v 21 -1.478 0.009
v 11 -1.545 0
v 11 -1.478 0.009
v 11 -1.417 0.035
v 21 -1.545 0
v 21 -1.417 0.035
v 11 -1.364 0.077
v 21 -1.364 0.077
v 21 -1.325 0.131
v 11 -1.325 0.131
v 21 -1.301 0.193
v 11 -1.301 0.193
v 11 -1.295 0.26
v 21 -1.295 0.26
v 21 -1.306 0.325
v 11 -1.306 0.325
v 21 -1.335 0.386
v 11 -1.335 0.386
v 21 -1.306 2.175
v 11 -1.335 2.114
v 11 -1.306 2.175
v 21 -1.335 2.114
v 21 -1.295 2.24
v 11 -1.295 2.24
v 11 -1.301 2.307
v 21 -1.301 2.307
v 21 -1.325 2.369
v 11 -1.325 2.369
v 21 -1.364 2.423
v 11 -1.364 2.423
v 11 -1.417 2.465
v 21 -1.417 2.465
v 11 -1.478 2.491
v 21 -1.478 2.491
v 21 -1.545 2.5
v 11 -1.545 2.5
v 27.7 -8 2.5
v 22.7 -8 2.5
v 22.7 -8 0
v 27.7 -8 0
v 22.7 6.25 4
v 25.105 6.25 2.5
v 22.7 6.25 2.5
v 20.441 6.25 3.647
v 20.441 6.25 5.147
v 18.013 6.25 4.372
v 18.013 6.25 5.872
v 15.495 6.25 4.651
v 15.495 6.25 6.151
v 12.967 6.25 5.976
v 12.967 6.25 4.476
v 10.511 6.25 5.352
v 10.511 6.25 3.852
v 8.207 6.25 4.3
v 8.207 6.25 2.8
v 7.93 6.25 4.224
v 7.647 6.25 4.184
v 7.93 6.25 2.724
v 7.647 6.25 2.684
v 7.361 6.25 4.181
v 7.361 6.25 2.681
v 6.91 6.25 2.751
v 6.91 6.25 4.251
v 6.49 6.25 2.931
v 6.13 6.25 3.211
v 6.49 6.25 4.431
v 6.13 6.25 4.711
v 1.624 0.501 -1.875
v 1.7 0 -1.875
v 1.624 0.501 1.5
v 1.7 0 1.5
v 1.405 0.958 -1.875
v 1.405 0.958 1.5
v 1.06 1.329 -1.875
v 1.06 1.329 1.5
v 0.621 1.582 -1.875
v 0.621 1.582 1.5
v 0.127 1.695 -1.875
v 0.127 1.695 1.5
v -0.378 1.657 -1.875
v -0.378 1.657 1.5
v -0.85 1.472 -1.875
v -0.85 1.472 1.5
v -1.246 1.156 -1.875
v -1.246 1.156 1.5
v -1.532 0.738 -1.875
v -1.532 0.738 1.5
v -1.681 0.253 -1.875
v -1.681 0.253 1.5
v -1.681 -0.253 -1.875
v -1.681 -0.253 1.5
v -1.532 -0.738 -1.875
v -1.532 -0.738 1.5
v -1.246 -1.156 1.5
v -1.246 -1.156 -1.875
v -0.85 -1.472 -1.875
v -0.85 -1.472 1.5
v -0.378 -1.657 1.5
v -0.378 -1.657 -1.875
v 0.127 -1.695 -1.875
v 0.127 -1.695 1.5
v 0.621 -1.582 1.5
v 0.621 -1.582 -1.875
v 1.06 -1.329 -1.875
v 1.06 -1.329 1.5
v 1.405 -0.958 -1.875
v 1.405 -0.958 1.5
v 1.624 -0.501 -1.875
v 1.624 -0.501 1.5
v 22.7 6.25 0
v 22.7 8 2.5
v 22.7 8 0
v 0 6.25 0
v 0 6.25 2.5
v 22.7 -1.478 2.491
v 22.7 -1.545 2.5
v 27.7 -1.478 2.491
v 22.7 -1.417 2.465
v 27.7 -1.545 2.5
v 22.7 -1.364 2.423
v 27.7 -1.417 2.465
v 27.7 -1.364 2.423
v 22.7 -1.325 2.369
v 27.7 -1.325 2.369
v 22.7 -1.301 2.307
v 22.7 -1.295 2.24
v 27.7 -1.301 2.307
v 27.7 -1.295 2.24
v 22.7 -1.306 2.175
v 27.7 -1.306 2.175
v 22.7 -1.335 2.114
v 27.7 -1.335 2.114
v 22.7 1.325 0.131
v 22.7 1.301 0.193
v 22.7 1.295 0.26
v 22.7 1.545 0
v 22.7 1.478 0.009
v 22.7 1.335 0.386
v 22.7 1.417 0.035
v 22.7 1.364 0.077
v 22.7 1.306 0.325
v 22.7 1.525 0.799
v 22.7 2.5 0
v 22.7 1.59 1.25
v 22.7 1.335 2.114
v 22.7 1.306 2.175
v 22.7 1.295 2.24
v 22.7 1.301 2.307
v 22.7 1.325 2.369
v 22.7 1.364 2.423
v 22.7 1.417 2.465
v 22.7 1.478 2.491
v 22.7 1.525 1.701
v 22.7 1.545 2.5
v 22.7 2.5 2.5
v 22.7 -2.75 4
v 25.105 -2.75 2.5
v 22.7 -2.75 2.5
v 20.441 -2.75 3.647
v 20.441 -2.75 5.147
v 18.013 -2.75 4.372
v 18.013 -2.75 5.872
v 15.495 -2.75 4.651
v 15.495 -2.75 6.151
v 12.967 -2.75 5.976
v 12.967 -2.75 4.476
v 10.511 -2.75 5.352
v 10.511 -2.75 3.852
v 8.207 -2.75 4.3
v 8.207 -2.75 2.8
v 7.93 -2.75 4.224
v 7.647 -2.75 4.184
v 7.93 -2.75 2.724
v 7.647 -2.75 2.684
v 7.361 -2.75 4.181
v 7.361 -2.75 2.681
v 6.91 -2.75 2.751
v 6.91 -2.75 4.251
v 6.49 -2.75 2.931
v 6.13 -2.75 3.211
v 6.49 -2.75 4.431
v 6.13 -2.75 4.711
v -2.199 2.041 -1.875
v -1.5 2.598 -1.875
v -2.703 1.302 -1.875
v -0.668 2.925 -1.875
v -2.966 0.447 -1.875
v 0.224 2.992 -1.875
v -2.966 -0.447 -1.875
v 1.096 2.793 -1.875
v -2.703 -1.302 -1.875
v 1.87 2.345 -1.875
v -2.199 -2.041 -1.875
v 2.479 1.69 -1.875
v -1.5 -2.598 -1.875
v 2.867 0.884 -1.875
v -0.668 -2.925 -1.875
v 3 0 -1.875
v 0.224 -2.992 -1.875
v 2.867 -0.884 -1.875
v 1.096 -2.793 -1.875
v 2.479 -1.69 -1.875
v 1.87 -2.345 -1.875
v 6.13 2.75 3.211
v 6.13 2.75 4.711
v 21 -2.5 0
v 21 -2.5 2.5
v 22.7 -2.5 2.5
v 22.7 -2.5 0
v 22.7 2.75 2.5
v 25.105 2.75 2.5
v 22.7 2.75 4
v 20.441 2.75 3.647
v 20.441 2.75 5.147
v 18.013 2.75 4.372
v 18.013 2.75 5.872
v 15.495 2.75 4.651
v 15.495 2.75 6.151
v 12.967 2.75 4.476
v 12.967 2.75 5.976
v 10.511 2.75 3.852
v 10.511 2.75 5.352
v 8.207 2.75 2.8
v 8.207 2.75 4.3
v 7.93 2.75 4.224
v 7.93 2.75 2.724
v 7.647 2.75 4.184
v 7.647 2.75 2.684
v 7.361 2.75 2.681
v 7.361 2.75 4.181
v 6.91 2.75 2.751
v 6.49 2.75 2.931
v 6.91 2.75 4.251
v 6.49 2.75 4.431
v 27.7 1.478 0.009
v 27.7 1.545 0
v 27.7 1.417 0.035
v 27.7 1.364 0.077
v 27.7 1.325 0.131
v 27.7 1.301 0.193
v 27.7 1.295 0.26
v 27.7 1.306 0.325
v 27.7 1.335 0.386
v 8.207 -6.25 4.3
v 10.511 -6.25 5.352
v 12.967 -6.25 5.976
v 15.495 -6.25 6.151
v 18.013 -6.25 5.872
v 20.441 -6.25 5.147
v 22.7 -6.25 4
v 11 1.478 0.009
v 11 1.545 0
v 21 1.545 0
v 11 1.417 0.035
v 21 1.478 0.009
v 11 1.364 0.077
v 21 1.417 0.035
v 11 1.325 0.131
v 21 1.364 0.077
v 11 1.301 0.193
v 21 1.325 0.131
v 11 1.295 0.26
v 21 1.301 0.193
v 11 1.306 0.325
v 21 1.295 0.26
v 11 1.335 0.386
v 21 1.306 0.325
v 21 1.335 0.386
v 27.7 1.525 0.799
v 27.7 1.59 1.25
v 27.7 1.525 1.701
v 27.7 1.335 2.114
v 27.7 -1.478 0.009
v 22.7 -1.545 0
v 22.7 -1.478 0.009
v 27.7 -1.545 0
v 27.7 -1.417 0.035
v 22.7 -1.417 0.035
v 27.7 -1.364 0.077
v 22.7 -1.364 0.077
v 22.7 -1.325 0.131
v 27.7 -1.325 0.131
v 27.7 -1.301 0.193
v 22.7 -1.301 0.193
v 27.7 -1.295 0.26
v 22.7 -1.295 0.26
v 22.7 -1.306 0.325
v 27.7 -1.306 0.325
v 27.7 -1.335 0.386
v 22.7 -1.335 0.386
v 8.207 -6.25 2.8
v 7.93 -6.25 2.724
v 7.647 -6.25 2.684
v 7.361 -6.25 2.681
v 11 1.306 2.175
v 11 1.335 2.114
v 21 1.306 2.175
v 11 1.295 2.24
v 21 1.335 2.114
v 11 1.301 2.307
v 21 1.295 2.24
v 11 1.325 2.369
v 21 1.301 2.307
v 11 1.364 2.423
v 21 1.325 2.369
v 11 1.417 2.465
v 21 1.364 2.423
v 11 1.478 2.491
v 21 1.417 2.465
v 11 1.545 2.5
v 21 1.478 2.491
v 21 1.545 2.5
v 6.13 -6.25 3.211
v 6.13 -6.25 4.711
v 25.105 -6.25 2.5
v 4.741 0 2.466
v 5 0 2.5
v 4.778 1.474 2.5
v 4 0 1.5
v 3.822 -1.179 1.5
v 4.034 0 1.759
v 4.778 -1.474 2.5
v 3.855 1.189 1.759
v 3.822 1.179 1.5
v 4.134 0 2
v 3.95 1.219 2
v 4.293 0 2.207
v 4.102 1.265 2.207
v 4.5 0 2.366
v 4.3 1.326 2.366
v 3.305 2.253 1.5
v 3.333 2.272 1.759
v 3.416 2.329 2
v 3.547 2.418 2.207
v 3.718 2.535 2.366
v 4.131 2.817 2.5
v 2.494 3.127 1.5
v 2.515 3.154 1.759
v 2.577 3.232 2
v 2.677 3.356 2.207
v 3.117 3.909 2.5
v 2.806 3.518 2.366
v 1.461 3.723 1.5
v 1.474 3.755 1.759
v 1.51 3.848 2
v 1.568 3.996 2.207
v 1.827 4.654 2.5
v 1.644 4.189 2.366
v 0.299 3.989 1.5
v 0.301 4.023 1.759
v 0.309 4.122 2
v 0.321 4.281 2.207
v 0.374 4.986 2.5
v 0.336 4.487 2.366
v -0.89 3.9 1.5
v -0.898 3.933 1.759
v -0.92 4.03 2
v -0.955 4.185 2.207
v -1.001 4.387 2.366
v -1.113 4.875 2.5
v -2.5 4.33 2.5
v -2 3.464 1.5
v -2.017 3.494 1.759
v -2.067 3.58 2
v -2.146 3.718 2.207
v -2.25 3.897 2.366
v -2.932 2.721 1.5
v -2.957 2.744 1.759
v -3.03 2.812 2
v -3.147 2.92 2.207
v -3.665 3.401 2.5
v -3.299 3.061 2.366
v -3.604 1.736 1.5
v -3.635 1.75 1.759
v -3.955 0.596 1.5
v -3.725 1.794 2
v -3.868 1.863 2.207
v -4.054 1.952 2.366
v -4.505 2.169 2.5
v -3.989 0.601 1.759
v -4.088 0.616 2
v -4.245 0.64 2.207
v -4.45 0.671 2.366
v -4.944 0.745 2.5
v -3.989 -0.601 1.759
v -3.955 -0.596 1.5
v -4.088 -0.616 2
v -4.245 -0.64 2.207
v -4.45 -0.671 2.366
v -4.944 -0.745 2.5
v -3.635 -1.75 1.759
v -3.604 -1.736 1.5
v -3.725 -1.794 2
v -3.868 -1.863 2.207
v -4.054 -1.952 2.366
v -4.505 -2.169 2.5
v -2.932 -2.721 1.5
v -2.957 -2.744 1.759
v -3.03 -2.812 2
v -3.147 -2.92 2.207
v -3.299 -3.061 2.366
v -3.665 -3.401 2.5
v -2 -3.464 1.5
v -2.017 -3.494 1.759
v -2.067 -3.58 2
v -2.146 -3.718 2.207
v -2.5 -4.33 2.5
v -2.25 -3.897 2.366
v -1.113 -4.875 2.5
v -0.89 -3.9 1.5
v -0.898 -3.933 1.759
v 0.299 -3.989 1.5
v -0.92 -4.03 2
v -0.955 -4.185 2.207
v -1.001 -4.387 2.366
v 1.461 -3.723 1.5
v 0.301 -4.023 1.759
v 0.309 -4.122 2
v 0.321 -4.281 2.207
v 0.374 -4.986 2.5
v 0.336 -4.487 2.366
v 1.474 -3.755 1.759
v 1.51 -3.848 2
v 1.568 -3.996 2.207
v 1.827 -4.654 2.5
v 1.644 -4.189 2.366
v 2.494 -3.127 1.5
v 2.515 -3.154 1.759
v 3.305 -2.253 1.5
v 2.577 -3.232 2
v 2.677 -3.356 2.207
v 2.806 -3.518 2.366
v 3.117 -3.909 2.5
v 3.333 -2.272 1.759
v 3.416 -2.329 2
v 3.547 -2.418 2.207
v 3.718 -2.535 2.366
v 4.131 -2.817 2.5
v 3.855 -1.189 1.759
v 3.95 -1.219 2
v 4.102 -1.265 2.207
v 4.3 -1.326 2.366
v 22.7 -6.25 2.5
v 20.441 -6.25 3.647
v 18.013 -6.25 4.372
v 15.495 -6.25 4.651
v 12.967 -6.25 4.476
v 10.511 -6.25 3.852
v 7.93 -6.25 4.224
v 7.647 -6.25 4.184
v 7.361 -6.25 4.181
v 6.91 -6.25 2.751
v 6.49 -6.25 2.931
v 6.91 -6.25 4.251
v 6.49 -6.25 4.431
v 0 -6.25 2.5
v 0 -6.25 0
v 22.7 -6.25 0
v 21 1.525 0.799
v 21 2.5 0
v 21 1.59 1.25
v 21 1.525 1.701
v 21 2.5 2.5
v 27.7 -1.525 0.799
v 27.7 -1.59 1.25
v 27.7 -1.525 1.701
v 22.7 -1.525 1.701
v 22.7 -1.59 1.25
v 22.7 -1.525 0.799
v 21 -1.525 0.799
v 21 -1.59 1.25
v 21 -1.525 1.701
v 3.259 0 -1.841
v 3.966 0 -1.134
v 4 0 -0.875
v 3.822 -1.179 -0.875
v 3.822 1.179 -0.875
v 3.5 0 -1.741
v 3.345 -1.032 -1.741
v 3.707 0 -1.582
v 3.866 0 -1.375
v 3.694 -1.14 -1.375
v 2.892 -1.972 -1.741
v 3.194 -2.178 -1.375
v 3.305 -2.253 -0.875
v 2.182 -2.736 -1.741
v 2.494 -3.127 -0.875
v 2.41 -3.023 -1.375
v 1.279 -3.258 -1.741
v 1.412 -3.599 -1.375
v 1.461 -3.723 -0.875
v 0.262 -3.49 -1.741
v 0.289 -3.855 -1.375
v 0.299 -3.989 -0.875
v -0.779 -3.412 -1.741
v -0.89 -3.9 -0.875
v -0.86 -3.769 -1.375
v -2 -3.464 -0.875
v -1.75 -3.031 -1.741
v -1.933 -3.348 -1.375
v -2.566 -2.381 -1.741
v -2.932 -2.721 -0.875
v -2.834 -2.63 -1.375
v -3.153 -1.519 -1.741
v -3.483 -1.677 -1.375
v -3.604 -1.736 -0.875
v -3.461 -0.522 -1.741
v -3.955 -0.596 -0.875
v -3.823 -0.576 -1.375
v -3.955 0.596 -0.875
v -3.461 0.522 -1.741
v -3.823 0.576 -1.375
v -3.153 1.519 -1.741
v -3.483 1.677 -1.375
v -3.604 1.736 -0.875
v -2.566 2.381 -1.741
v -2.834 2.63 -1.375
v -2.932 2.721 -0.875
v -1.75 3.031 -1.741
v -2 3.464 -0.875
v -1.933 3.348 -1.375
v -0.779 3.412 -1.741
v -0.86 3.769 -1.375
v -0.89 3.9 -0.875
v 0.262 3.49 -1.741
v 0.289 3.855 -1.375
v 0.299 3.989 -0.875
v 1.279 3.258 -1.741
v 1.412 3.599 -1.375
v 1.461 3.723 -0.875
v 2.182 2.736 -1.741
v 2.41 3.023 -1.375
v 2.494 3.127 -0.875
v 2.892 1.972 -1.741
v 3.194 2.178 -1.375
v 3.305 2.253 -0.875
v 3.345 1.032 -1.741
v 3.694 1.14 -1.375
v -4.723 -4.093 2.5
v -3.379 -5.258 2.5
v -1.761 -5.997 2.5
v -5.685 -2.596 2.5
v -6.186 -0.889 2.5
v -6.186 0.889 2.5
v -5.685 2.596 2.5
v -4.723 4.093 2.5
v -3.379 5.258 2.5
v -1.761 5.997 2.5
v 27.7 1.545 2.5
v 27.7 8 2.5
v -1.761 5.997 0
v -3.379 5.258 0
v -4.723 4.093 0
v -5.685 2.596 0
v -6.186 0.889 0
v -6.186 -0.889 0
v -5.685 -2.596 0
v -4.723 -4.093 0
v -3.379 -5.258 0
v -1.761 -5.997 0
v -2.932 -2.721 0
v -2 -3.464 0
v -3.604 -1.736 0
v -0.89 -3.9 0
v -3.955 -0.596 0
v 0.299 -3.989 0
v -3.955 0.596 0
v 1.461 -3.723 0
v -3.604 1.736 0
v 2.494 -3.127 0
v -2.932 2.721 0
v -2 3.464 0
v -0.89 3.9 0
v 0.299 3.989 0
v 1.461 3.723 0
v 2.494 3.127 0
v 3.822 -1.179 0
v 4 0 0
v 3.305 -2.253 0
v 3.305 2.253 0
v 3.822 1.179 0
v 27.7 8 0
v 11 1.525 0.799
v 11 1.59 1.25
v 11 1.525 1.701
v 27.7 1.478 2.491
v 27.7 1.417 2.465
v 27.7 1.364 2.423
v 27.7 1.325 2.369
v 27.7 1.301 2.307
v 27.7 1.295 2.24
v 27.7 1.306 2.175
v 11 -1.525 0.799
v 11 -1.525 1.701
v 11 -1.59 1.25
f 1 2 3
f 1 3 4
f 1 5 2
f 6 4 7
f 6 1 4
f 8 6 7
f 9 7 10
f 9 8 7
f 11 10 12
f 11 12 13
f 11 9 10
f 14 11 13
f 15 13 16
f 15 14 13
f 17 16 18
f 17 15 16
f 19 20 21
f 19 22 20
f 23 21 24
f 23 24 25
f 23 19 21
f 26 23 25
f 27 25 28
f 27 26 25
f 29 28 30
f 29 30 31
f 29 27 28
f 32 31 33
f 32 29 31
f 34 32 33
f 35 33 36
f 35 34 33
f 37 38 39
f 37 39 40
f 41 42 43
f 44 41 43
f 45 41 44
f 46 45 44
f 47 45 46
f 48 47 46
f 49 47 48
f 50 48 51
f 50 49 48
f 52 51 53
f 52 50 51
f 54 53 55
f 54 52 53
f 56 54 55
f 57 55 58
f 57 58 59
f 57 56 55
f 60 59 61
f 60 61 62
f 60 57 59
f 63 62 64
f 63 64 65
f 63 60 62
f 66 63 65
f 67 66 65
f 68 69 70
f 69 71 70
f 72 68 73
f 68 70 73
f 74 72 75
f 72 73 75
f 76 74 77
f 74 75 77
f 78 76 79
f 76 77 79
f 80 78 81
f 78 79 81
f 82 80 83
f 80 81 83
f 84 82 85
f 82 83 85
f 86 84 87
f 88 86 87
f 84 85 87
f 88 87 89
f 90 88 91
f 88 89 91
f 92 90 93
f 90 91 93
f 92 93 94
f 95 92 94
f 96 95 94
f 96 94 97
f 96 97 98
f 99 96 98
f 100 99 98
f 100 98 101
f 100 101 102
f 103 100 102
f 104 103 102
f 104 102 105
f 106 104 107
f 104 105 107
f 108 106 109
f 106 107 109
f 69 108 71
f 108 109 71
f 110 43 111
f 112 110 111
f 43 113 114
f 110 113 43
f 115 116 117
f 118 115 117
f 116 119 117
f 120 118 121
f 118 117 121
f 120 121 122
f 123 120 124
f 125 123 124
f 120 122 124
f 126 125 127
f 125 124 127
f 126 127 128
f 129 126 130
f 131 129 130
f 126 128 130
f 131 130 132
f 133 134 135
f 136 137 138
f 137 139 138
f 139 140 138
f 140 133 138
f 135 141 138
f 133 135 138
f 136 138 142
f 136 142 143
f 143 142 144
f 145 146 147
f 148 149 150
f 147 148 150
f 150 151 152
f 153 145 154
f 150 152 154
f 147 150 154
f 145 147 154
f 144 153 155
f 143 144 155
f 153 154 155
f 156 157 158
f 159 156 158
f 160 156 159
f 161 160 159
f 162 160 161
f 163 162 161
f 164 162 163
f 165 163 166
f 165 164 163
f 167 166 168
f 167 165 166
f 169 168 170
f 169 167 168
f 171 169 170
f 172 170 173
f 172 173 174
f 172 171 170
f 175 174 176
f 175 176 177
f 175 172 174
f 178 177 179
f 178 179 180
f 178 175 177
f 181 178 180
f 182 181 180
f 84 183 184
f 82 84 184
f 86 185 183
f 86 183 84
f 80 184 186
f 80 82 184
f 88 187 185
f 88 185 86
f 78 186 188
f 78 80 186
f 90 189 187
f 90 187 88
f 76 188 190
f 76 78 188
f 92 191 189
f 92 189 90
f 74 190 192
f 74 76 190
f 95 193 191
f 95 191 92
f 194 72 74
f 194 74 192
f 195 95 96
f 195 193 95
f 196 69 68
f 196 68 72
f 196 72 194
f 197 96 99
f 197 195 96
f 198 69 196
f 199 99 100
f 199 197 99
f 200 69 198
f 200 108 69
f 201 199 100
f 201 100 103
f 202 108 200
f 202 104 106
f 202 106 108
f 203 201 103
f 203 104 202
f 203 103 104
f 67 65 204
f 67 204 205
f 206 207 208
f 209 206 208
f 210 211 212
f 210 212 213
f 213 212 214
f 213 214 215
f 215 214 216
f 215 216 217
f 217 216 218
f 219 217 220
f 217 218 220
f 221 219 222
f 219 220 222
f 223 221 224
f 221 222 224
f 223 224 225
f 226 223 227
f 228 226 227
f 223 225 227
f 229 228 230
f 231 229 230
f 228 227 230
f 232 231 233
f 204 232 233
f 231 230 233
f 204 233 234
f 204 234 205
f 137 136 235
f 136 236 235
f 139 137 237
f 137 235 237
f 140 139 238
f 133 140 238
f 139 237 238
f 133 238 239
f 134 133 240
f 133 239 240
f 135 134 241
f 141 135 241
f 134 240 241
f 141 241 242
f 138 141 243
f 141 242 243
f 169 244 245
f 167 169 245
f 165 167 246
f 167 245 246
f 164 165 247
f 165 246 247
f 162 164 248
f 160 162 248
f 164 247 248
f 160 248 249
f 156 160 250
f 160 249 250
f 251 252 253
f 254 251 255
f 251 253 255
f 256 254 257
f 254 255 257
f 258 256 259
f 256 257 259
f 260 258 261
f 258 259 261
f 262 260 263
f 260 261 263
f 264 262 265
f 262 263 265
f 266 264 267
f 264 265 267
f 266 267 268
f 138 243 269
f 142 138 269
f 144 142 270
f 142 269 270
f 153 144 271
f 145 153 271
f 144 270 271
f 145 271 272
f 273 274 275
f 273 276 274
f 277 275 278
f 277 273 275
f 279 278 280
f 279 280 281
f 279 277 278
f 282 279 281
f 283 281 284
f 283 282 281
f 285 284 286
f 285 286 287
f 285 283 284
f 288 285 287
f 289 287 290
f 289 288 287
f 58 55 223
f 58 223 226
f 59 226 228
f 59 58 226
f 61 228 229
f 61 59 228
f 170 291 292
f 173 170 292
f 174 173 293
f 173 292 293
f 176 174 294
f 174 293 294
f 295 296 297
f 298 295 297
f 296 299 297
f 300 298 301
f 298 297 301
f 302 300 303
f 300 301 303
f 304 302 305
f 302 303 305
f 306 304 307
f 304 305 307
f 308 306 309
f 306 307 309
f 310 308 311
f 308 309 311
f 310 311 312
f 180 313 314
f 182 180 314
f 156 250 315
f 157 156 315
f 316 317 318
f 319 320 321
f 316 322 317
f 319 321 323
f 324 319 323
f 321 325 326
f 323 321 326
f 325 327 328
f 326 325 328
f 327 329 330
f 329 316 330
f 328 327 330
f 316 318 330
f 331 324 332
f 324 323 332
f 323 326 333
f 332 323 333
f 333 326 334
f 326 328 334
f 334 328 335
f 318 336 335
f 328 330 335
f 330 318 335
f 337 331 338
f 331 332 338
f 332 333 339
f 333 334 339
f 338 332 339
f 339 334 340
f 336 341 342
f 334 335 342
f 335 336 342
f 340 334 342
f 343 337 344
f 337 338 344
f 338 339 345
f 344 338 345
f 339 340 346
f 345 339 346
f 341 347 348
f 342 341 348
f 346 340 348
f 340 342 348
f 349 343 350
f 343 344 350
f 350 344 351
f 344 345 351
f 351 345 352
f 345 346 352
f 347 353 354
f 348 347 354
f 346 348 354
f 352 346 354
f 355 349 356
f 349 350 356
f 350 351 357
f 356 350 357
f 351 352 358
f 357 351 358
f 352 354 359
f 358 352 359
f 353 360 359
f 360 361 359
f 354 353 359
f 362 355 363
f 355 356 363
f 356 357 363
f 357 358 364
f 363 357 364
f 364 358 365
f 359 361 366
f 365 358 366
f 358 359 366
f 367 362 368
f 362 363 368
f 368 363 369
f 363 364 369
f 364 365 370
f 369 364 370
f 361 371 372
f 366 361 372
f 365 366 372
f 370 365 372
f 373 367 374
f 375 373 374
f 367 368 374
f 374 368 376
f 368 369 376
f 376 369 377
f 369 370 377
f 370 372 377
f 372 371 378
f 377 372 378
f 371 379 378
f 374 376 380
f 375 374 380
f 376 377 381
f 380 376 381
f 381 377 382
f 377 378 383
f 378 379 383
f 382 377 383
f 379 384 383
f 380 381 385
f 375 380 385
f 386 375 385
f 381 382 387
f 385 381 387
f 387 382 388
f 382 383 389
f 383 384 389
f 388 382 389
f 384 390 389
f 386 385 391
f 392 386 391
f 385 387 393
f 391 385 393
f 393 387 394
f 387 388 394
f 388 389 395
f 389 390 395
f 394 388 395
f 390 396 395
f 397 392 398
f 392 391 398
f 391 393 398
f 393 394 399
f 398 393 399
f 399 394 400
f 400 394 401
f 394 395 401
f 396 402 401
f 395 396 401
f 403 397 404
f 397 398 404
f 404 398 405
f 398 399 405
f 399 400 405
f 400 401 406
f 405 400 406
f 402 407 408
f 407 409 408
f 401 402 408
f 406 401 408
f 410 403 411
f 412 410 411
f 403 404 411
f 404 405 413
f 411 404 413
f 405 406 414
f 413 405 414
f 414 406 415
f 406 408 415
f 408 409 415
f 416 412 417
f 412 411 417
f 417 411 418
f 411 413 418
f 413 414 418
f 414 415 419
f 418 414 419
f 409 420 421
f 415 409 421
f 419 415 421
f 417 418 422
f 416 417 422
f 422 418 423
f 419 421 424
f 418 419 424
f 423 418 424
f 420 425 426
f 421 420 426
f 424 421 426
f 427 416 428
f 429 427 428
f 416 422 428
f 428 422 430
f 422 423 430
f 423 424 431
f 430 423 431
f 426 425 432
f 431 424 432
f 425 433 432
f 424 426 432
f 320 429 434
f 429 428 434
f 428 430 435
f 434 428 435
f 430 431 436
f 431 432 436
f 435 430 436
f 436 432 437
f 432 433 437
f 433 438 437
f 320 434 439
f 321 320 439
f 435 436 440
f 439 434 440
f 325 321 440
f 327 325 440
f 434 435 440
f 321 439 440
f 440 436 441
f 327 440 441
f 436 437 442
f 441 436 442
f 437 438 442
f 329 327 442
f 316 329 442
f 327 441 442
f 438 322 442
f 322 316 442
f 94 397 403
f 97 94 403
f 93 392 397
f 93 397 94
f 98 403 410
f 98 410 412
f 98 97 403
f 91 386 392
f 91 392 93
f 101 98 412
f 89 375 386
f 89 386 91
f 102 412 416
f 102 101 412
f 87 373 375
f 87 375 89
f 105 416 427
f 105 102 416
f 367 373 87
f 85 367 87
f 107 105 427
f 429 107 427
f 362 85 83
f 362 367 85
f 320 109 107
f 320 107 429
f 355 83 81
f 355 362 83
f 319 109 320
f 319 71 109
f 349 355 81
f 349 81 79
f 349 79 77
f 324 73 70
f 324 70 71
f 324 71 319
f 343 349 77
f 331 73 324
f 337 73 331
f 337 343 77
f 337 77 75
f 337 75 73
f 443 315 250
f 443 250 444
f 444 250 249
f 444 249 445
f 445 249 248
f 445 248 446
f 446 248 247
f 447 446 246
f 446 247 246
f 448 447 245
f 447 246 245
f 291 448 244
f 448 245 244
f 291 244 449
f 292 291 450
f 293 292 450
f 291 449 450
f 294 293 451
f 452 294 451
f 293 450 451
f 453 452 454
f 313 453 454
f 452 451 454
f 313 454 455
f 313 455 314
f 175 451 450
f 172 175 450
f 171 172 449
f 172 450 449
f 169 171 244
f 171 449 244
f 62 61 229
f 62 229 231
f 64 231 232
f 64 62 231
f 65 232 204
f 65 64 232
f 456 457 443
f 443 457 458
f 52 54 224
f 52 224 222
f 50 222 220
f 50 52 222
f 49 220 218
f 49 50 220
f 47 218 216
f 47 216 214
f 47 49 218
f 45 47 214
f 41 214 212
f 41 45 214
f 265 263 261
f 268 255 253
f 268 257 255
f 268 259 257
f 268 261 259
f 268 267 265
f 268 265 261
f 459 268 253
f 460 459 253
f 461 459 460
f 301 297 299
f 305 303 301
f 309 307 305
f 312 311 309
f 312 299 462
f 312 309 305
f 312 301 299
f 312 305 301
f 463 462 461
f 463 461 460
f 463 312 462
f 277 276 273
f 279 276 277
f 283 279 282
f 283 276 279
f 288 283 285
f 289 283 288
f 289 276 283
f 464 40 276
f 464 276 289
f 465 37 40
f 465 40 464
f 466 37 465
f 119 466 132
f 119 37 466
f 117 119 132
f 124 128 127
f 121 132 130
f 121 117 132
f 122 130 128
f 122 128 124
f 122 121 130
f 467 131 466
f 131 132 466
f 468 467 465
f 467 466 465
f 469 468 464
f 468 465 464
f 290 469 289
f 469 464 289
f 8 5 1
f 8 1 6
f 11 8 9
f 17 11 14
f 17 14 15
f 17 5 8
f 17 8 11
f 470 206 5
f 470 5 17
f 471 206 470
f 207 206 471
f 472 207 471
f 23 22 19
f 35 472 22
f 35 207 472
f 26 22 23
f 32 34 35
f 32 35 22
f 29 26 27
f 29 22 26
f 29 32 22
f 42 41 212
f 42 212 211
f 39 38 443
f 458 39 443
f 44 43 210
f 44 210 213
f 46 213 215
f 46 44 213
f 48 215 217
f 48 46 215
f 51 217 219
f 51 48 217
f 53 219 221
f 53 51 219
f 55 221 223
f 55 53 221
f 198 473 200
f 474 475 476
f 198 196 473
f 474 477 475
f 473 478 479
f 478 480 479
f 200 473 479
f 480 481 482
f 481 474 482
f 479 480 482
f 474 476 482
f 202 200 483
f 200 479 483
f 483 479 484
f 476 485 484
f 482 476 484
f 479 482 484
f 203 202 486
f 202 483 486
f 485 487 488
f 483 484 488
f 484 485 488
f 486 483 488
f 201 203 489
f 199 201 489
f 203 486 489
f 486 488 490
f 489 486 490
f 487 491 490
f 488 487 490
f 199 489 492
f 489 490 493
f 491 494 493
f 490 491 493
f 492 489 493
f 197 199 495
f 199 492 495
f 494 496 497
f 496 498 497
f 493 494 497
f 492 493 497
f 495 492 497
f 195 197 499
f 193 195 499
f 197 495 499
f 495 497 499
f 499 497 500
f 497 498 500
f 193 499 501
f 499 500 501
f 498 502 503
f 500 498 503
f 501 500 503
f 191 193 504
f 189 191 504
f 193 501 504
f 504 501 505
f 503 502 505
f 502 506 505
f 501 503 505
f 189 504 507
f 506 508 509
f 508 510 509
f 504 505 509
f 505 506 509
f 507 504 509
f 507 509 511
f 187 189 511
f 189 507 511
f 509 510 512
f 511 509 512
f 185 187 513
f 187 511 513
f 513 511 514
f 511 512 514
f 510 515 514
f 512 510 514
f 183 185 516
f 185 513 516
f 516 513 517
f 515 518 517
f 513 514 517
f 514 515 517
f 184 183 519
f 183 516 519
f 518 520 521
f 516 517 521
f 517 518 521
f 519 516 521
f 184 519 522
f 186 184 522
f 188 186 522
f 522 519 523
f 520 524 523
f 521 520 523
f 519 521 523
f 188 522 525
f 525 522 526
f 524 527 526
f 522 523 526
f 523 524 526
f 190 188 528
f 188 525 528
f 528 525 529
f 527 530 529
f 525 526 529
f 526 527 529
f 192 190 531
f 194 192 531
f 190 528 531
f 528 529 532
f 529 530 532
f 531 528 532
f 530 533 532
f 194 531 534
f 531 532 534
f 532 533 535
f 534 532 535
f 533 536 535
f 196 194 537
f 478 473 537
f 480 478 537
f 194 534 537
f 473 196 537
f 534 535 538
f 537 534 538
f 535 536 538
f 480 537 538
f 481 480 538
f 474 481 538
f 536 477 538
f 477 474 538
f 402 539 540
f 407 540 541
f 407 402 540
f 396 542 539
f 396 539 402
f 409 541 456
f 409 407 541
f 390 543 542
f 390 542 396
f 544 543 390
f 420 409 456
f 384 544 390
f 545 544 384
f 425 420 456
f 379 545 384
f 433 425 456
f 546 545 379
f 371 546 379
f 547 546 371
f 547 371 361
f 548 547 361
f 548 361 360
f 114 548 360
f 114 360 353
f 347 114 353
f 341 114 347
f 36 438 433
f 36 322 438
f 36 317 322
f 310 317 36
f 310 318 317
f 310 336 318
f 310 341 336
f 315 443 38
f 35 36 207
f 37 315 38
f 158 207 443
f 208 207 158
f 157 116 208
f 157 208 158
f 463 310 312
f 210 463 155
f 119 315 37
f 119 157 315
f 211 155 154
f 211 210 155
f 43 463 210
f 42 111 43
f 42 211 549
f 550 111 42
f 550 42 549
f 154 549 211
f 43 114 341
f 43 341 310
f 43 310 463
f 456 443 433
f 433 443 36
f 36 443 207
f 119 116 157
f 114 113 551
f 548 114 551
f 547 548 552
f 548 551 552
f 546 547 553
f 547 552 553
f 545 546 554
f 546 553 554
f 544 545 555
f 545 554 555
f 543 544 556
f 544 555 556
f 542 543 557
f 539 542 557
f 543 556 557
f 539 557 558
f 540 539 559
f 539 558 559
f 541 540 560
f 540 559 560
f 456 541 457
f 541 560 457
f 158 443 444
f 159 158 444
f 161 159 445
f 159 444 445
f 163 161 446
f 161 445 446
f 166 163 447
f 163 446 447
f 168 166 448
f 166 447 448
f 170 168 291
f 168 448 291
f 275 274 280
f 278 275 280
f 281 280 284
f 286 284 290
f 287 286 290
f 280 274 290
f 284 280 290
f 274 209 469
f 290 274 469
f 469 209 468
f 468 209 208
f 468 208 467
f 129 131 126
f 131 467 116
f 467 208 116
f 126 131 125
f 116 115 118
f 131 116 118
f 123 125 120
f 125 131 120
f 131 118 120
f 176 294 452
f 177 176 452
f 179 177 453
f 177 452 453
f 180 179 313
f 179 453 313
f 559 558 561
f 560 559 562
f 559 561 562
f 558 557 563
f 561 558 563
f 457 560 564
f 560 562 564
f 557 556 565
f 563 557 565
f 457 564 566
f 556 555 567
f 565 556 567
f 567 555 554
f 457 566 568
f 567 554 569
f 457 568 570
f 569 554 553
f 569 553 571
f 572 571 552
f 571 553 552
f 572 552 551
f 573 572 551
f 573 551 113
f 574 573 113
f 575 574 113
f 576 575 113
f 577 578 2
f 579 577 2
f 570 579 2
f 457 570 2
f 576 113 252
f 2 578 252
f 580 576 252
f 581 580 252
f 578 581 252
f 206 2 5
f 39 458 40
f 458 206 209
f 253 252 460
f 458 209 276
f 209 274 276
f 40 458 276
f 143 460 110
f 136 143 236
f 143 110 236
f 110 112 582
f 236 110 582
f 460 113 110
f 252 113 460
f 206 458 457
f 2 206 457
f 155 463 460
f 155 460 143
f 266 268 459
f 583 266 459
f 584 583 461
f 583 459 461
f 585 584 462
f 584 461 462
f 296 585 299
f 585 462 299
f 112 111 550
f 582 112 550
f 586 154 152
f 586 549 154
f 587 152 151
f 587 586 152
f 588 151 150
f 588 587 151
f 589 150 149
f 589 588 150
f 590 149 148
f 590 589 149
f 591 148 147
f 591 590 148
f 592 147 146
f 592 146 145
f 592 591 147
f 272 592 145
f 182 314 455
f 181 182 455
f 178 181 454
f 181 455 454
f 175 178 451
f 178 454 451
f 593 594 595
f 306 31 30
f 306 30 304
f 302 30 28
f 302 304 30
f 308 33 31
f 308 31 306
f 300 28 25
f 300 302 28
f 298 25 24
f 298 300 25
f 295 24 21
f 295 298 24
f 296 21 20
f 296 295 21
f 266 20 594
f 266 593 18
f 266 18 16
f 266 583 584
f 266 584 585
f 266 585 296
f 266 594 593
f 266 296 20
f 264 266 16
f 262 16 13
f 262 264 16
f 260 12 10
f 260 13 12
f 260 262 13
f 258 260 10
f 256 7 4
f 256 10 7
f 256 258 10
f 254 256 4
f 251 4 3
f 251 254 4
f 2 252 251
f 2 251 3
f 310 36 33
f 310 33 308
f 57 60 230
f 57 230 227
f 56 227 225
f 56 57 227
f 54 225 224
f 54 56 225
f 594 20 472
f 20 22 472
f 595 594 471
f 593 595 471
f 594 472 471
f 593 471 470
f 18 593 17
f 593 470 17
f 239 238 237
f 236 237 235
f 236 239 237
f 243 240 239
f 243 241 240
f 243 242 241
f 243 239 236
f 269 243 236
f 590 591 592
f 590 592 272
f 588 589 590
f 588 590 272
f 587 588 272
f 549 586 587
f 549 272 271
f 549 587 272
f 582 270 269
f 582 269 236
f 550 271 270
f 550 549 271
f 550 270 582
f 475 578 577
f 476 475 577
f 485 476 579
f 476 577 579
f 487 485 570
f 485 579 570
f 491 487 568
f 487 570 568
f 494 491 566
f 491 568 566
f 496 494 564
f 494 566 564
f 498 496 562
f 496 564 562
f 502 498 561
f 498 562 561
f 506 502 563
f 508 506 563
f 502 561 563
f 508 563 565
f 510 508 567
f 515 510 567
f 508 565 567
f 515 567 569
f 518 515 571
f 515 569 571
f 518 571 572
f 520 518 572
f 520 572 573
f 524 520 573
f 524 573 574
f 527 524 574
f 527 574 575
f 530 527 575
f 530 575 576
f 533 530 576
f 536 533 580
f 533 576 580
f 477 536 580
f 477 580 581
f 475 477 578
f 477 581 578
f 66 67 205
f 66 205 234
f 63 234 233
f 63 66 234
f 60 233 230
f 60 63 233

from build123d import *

# Parameters (mm, degrees)
SKETCH1_R           = 1.7
SKETCH1_W           = 10
SKETCH1_H           = 12.5
BOSS_EXTRUDE1_DEPTH = 2.5
SKETCH2_W           = 5
SKETCH2_H           = 16
BOSS_EXTRUDE2_DEPTH = 2.5
SKETCH3_W           = 1.7
SKETCH3_H           = 5
CUT_EXTRUDE1_DEPTH  = 29.940283343
SKETCH6_R           = 1.59
CUT_EXTRUDE3_DEPTH  = 16.7
BOSS_EXTRUDE3_DEPTH = 3.5
BOSS_EXTRUDE5_DEPTH = 3.5
SKETCH10_R          = 4
BOSS_EXTRUDE6_DEPTH = 1.875
SKETCH11_R          = 1.7
CUT_EXTRUDE4_DEPTH  = 30.481567746
SKETCH12_R          = 4
CUT_EXTRUDE5_DEPTH  = 1
FILLET1_R           = 1
FILLET2_R           = 1
FILLET3_R           = 0.25
FILLET4_R           = 0.25


with BuildPart() as part:
    # Sketch1 → Boss-Extrude1 (new body)
    # profile 1 of 2: a face of its own
    with BuildSketch(Plane.XY):
        with BuildLine():
            ThreePointArc((0, 6.25), (-6.25, 0), (0, -6.25))
            Line((0, -6.25), (12.7, -6.25))
            Line((12.7, -6.25), (12.7, 6.25))
            Line((12.7, 6.25), (0, 6.25))
        make_face()
        Circle(SKETCH1_R, mode=Mode.SUBTRACT)
    # profile 2 of 2: a face of its own
    with BuildSketch(Plane.XY):
        with Locations((17.7, 0)):
            Rectangle(SKETCH1_W, SKETCH1_H)
    extrude(amount=BOSS_EXTRUDE1_DEPTH)

    # Sketch2 → Boss-Extrude2 (add)
    with BuildSketch(Plane.XY.offset(2.5)):
        with Locations((25.2, 0)):
            Rectangle(SKETCH2_W, SKETCH2_H)
    extrude(amount=-BOSS_EXTRUDE2_DEPTH)

    # Sketch3 → Cut-Extrude1 (cut, through all)
    with BuildSketch(Plane.XY.offset(2.5)):
        with Locations((21.85, 0)):
            Rectangle(SKETCH3_W, SKETCH3_H)
    extrude(amount=-CUT_EXTRUDE1_DEPTH, mode=Mode.SUBTRACT)

    # Sketch6 → Cut-Extrude3 (cut)
    with BuildSketch(Plane(origin=(27.7, 0, 0), x_dir=(0, 0, -1), z_dir=(1, 0, 0))):
        with Locations((-1.25, 0)):
            Circle(SKETCH6_R)
    extrude(amount=-CUT_EXTRUDE3_DEPTH, mode=Mode.SUBTRACT)


with BuildPart() as body_2:
    # Sketch7 → Boss-Extrude3 (new body)
    with BuildSketch(Plane.XZ.offset(6.25)):
        with BuildLine():
            Line((6.129900512, 3.210673711), (6.129900512, 4.710673711))
            ThreePointArc((6.129900512, 4.710673711), (6.694341527, 4.327552018), (7.360579964, 4.180915603))
            ThreePointArc((7.360579964, 4.180915603), (7.789326283, 4.199870579), (8.206709695, 4.299739418))
            ThreePointArc((8.206709695, 4.299739418), (15.494742209, 6.151071465), (22.7, 4))
            Line((22.7, 4), (22.7, 2.5))
            ThreePointArc((22.7, 2.5), (15.494742209, 4.651071465), (8.206709695, 2.799739418))
            ThreePointArc((8.206709695, 2.799739418), (7.789326283, 2.699870579), (7.360579964, 2.680915603))
            ThreePointArc((7.360579964, 2.680915603), (6.694341527, 2.827552018), (6.129900512, 3.210673711))
        make_face()
    extrude(amount=-BOSS_EXTRUDE3_DEPTH)


with BuildPart() as body_3:
    # Sketch9 → Boss-Extrude5 (new body)
    with BuildSketch(Plane.XZ.offset(6.25)):
        Polygon((22.7, 4), (25.104907101, 2.5), (22.7, 2.5), align=None)
    extrude(amount=-BOSS_EXTRUDE5_DEPTH)

    # Combine1: union body 2
    add(body_2.part)


with BuildPart() as body_3_2:
    # Mirror5: mirrored copy
    add(body_3.part.mirror(Plane(origin=(0, 0, 0), x_dir=(0, 0, 1), z_dir=(0, -1, 0))))


with BuildPart() as part_1:
    add(part.part)

    # Combine4: union body 3, body 3 2
    add(body_3.part)
    add(body_3_2.part)

    # Sketch10 → Boss-Extrude6 (add)
    with BuildSketch(Plane(origin=(0, 0, 0), x_dir=(-1, 0, 0), z_dir=(0, 0, -1))):
        with Locations(Location((0, 0, 0), (0, 0, 180))):
            Circle(SKETCH10_R)
    extrude(amount=BOSS_EXTRUDE6_DEPTH)

    # Sketch11 → Cut-Extrude4 (cut, through all)
    with BuildSketch(Plane.XY):
        Circle(SKETCH11_R)
    extrude(amount=-CUT_EXTRUDE4_DEPTH, mode=Mode.SUBTRACT)

    # Sketch12 → Cut-Extrude5 (cut)
    with BuildSketch(Plane.XY.offset(2.5)):
        Circle(SKETCH12_R)
    extrude(amount=-CUT_EXTRUDE5_DEPTH, mode=Mode.SUBTRACT)

    # Fillet1
    fillet1_edges = [part_1.edges().sort_by_distance(p)[0] for p in [
        (-4, 0, 2.5),
    ]]
    fillet(fillet1_edges, radius=FILLET1_R - 0.0001)  # a hair under: the kernel refuses the full size

    # Fillet2
    fillet2_edges = [part_1.edges().sort_by_distance(p)[0] for p in [
        (-4, 0, -1.875),
    ]]
    fillet(fillet2_edges, radius=FILLET2_R)

    # Fillet3
    fillet3_edges = [part_1.edges().sort_by_distance(p)[0] for p in [
        (16, 0.98264948, 2.5),
        (16, -0.98264948, 2.5),
        (16, 0.98264948, 0),
        (16, -0.98264948, 0),
    ]]
    fillet(fillet3_edges, radius=FILLET3_R)

    # Fillet4
    fillet4_edges = [part_1.edges().sort_by_distance(p)[0] for p in [
        (25.2, 0.98264948, 2.5),
        (25.2, -0.98264948, 2.5),
        (25.2, 0.98264948, 0),
        (25.2, -0.98264948, 0),
    ]]
    fillet(fillet4_edges, radius=FILLET4_R)


solid = part_1.part
